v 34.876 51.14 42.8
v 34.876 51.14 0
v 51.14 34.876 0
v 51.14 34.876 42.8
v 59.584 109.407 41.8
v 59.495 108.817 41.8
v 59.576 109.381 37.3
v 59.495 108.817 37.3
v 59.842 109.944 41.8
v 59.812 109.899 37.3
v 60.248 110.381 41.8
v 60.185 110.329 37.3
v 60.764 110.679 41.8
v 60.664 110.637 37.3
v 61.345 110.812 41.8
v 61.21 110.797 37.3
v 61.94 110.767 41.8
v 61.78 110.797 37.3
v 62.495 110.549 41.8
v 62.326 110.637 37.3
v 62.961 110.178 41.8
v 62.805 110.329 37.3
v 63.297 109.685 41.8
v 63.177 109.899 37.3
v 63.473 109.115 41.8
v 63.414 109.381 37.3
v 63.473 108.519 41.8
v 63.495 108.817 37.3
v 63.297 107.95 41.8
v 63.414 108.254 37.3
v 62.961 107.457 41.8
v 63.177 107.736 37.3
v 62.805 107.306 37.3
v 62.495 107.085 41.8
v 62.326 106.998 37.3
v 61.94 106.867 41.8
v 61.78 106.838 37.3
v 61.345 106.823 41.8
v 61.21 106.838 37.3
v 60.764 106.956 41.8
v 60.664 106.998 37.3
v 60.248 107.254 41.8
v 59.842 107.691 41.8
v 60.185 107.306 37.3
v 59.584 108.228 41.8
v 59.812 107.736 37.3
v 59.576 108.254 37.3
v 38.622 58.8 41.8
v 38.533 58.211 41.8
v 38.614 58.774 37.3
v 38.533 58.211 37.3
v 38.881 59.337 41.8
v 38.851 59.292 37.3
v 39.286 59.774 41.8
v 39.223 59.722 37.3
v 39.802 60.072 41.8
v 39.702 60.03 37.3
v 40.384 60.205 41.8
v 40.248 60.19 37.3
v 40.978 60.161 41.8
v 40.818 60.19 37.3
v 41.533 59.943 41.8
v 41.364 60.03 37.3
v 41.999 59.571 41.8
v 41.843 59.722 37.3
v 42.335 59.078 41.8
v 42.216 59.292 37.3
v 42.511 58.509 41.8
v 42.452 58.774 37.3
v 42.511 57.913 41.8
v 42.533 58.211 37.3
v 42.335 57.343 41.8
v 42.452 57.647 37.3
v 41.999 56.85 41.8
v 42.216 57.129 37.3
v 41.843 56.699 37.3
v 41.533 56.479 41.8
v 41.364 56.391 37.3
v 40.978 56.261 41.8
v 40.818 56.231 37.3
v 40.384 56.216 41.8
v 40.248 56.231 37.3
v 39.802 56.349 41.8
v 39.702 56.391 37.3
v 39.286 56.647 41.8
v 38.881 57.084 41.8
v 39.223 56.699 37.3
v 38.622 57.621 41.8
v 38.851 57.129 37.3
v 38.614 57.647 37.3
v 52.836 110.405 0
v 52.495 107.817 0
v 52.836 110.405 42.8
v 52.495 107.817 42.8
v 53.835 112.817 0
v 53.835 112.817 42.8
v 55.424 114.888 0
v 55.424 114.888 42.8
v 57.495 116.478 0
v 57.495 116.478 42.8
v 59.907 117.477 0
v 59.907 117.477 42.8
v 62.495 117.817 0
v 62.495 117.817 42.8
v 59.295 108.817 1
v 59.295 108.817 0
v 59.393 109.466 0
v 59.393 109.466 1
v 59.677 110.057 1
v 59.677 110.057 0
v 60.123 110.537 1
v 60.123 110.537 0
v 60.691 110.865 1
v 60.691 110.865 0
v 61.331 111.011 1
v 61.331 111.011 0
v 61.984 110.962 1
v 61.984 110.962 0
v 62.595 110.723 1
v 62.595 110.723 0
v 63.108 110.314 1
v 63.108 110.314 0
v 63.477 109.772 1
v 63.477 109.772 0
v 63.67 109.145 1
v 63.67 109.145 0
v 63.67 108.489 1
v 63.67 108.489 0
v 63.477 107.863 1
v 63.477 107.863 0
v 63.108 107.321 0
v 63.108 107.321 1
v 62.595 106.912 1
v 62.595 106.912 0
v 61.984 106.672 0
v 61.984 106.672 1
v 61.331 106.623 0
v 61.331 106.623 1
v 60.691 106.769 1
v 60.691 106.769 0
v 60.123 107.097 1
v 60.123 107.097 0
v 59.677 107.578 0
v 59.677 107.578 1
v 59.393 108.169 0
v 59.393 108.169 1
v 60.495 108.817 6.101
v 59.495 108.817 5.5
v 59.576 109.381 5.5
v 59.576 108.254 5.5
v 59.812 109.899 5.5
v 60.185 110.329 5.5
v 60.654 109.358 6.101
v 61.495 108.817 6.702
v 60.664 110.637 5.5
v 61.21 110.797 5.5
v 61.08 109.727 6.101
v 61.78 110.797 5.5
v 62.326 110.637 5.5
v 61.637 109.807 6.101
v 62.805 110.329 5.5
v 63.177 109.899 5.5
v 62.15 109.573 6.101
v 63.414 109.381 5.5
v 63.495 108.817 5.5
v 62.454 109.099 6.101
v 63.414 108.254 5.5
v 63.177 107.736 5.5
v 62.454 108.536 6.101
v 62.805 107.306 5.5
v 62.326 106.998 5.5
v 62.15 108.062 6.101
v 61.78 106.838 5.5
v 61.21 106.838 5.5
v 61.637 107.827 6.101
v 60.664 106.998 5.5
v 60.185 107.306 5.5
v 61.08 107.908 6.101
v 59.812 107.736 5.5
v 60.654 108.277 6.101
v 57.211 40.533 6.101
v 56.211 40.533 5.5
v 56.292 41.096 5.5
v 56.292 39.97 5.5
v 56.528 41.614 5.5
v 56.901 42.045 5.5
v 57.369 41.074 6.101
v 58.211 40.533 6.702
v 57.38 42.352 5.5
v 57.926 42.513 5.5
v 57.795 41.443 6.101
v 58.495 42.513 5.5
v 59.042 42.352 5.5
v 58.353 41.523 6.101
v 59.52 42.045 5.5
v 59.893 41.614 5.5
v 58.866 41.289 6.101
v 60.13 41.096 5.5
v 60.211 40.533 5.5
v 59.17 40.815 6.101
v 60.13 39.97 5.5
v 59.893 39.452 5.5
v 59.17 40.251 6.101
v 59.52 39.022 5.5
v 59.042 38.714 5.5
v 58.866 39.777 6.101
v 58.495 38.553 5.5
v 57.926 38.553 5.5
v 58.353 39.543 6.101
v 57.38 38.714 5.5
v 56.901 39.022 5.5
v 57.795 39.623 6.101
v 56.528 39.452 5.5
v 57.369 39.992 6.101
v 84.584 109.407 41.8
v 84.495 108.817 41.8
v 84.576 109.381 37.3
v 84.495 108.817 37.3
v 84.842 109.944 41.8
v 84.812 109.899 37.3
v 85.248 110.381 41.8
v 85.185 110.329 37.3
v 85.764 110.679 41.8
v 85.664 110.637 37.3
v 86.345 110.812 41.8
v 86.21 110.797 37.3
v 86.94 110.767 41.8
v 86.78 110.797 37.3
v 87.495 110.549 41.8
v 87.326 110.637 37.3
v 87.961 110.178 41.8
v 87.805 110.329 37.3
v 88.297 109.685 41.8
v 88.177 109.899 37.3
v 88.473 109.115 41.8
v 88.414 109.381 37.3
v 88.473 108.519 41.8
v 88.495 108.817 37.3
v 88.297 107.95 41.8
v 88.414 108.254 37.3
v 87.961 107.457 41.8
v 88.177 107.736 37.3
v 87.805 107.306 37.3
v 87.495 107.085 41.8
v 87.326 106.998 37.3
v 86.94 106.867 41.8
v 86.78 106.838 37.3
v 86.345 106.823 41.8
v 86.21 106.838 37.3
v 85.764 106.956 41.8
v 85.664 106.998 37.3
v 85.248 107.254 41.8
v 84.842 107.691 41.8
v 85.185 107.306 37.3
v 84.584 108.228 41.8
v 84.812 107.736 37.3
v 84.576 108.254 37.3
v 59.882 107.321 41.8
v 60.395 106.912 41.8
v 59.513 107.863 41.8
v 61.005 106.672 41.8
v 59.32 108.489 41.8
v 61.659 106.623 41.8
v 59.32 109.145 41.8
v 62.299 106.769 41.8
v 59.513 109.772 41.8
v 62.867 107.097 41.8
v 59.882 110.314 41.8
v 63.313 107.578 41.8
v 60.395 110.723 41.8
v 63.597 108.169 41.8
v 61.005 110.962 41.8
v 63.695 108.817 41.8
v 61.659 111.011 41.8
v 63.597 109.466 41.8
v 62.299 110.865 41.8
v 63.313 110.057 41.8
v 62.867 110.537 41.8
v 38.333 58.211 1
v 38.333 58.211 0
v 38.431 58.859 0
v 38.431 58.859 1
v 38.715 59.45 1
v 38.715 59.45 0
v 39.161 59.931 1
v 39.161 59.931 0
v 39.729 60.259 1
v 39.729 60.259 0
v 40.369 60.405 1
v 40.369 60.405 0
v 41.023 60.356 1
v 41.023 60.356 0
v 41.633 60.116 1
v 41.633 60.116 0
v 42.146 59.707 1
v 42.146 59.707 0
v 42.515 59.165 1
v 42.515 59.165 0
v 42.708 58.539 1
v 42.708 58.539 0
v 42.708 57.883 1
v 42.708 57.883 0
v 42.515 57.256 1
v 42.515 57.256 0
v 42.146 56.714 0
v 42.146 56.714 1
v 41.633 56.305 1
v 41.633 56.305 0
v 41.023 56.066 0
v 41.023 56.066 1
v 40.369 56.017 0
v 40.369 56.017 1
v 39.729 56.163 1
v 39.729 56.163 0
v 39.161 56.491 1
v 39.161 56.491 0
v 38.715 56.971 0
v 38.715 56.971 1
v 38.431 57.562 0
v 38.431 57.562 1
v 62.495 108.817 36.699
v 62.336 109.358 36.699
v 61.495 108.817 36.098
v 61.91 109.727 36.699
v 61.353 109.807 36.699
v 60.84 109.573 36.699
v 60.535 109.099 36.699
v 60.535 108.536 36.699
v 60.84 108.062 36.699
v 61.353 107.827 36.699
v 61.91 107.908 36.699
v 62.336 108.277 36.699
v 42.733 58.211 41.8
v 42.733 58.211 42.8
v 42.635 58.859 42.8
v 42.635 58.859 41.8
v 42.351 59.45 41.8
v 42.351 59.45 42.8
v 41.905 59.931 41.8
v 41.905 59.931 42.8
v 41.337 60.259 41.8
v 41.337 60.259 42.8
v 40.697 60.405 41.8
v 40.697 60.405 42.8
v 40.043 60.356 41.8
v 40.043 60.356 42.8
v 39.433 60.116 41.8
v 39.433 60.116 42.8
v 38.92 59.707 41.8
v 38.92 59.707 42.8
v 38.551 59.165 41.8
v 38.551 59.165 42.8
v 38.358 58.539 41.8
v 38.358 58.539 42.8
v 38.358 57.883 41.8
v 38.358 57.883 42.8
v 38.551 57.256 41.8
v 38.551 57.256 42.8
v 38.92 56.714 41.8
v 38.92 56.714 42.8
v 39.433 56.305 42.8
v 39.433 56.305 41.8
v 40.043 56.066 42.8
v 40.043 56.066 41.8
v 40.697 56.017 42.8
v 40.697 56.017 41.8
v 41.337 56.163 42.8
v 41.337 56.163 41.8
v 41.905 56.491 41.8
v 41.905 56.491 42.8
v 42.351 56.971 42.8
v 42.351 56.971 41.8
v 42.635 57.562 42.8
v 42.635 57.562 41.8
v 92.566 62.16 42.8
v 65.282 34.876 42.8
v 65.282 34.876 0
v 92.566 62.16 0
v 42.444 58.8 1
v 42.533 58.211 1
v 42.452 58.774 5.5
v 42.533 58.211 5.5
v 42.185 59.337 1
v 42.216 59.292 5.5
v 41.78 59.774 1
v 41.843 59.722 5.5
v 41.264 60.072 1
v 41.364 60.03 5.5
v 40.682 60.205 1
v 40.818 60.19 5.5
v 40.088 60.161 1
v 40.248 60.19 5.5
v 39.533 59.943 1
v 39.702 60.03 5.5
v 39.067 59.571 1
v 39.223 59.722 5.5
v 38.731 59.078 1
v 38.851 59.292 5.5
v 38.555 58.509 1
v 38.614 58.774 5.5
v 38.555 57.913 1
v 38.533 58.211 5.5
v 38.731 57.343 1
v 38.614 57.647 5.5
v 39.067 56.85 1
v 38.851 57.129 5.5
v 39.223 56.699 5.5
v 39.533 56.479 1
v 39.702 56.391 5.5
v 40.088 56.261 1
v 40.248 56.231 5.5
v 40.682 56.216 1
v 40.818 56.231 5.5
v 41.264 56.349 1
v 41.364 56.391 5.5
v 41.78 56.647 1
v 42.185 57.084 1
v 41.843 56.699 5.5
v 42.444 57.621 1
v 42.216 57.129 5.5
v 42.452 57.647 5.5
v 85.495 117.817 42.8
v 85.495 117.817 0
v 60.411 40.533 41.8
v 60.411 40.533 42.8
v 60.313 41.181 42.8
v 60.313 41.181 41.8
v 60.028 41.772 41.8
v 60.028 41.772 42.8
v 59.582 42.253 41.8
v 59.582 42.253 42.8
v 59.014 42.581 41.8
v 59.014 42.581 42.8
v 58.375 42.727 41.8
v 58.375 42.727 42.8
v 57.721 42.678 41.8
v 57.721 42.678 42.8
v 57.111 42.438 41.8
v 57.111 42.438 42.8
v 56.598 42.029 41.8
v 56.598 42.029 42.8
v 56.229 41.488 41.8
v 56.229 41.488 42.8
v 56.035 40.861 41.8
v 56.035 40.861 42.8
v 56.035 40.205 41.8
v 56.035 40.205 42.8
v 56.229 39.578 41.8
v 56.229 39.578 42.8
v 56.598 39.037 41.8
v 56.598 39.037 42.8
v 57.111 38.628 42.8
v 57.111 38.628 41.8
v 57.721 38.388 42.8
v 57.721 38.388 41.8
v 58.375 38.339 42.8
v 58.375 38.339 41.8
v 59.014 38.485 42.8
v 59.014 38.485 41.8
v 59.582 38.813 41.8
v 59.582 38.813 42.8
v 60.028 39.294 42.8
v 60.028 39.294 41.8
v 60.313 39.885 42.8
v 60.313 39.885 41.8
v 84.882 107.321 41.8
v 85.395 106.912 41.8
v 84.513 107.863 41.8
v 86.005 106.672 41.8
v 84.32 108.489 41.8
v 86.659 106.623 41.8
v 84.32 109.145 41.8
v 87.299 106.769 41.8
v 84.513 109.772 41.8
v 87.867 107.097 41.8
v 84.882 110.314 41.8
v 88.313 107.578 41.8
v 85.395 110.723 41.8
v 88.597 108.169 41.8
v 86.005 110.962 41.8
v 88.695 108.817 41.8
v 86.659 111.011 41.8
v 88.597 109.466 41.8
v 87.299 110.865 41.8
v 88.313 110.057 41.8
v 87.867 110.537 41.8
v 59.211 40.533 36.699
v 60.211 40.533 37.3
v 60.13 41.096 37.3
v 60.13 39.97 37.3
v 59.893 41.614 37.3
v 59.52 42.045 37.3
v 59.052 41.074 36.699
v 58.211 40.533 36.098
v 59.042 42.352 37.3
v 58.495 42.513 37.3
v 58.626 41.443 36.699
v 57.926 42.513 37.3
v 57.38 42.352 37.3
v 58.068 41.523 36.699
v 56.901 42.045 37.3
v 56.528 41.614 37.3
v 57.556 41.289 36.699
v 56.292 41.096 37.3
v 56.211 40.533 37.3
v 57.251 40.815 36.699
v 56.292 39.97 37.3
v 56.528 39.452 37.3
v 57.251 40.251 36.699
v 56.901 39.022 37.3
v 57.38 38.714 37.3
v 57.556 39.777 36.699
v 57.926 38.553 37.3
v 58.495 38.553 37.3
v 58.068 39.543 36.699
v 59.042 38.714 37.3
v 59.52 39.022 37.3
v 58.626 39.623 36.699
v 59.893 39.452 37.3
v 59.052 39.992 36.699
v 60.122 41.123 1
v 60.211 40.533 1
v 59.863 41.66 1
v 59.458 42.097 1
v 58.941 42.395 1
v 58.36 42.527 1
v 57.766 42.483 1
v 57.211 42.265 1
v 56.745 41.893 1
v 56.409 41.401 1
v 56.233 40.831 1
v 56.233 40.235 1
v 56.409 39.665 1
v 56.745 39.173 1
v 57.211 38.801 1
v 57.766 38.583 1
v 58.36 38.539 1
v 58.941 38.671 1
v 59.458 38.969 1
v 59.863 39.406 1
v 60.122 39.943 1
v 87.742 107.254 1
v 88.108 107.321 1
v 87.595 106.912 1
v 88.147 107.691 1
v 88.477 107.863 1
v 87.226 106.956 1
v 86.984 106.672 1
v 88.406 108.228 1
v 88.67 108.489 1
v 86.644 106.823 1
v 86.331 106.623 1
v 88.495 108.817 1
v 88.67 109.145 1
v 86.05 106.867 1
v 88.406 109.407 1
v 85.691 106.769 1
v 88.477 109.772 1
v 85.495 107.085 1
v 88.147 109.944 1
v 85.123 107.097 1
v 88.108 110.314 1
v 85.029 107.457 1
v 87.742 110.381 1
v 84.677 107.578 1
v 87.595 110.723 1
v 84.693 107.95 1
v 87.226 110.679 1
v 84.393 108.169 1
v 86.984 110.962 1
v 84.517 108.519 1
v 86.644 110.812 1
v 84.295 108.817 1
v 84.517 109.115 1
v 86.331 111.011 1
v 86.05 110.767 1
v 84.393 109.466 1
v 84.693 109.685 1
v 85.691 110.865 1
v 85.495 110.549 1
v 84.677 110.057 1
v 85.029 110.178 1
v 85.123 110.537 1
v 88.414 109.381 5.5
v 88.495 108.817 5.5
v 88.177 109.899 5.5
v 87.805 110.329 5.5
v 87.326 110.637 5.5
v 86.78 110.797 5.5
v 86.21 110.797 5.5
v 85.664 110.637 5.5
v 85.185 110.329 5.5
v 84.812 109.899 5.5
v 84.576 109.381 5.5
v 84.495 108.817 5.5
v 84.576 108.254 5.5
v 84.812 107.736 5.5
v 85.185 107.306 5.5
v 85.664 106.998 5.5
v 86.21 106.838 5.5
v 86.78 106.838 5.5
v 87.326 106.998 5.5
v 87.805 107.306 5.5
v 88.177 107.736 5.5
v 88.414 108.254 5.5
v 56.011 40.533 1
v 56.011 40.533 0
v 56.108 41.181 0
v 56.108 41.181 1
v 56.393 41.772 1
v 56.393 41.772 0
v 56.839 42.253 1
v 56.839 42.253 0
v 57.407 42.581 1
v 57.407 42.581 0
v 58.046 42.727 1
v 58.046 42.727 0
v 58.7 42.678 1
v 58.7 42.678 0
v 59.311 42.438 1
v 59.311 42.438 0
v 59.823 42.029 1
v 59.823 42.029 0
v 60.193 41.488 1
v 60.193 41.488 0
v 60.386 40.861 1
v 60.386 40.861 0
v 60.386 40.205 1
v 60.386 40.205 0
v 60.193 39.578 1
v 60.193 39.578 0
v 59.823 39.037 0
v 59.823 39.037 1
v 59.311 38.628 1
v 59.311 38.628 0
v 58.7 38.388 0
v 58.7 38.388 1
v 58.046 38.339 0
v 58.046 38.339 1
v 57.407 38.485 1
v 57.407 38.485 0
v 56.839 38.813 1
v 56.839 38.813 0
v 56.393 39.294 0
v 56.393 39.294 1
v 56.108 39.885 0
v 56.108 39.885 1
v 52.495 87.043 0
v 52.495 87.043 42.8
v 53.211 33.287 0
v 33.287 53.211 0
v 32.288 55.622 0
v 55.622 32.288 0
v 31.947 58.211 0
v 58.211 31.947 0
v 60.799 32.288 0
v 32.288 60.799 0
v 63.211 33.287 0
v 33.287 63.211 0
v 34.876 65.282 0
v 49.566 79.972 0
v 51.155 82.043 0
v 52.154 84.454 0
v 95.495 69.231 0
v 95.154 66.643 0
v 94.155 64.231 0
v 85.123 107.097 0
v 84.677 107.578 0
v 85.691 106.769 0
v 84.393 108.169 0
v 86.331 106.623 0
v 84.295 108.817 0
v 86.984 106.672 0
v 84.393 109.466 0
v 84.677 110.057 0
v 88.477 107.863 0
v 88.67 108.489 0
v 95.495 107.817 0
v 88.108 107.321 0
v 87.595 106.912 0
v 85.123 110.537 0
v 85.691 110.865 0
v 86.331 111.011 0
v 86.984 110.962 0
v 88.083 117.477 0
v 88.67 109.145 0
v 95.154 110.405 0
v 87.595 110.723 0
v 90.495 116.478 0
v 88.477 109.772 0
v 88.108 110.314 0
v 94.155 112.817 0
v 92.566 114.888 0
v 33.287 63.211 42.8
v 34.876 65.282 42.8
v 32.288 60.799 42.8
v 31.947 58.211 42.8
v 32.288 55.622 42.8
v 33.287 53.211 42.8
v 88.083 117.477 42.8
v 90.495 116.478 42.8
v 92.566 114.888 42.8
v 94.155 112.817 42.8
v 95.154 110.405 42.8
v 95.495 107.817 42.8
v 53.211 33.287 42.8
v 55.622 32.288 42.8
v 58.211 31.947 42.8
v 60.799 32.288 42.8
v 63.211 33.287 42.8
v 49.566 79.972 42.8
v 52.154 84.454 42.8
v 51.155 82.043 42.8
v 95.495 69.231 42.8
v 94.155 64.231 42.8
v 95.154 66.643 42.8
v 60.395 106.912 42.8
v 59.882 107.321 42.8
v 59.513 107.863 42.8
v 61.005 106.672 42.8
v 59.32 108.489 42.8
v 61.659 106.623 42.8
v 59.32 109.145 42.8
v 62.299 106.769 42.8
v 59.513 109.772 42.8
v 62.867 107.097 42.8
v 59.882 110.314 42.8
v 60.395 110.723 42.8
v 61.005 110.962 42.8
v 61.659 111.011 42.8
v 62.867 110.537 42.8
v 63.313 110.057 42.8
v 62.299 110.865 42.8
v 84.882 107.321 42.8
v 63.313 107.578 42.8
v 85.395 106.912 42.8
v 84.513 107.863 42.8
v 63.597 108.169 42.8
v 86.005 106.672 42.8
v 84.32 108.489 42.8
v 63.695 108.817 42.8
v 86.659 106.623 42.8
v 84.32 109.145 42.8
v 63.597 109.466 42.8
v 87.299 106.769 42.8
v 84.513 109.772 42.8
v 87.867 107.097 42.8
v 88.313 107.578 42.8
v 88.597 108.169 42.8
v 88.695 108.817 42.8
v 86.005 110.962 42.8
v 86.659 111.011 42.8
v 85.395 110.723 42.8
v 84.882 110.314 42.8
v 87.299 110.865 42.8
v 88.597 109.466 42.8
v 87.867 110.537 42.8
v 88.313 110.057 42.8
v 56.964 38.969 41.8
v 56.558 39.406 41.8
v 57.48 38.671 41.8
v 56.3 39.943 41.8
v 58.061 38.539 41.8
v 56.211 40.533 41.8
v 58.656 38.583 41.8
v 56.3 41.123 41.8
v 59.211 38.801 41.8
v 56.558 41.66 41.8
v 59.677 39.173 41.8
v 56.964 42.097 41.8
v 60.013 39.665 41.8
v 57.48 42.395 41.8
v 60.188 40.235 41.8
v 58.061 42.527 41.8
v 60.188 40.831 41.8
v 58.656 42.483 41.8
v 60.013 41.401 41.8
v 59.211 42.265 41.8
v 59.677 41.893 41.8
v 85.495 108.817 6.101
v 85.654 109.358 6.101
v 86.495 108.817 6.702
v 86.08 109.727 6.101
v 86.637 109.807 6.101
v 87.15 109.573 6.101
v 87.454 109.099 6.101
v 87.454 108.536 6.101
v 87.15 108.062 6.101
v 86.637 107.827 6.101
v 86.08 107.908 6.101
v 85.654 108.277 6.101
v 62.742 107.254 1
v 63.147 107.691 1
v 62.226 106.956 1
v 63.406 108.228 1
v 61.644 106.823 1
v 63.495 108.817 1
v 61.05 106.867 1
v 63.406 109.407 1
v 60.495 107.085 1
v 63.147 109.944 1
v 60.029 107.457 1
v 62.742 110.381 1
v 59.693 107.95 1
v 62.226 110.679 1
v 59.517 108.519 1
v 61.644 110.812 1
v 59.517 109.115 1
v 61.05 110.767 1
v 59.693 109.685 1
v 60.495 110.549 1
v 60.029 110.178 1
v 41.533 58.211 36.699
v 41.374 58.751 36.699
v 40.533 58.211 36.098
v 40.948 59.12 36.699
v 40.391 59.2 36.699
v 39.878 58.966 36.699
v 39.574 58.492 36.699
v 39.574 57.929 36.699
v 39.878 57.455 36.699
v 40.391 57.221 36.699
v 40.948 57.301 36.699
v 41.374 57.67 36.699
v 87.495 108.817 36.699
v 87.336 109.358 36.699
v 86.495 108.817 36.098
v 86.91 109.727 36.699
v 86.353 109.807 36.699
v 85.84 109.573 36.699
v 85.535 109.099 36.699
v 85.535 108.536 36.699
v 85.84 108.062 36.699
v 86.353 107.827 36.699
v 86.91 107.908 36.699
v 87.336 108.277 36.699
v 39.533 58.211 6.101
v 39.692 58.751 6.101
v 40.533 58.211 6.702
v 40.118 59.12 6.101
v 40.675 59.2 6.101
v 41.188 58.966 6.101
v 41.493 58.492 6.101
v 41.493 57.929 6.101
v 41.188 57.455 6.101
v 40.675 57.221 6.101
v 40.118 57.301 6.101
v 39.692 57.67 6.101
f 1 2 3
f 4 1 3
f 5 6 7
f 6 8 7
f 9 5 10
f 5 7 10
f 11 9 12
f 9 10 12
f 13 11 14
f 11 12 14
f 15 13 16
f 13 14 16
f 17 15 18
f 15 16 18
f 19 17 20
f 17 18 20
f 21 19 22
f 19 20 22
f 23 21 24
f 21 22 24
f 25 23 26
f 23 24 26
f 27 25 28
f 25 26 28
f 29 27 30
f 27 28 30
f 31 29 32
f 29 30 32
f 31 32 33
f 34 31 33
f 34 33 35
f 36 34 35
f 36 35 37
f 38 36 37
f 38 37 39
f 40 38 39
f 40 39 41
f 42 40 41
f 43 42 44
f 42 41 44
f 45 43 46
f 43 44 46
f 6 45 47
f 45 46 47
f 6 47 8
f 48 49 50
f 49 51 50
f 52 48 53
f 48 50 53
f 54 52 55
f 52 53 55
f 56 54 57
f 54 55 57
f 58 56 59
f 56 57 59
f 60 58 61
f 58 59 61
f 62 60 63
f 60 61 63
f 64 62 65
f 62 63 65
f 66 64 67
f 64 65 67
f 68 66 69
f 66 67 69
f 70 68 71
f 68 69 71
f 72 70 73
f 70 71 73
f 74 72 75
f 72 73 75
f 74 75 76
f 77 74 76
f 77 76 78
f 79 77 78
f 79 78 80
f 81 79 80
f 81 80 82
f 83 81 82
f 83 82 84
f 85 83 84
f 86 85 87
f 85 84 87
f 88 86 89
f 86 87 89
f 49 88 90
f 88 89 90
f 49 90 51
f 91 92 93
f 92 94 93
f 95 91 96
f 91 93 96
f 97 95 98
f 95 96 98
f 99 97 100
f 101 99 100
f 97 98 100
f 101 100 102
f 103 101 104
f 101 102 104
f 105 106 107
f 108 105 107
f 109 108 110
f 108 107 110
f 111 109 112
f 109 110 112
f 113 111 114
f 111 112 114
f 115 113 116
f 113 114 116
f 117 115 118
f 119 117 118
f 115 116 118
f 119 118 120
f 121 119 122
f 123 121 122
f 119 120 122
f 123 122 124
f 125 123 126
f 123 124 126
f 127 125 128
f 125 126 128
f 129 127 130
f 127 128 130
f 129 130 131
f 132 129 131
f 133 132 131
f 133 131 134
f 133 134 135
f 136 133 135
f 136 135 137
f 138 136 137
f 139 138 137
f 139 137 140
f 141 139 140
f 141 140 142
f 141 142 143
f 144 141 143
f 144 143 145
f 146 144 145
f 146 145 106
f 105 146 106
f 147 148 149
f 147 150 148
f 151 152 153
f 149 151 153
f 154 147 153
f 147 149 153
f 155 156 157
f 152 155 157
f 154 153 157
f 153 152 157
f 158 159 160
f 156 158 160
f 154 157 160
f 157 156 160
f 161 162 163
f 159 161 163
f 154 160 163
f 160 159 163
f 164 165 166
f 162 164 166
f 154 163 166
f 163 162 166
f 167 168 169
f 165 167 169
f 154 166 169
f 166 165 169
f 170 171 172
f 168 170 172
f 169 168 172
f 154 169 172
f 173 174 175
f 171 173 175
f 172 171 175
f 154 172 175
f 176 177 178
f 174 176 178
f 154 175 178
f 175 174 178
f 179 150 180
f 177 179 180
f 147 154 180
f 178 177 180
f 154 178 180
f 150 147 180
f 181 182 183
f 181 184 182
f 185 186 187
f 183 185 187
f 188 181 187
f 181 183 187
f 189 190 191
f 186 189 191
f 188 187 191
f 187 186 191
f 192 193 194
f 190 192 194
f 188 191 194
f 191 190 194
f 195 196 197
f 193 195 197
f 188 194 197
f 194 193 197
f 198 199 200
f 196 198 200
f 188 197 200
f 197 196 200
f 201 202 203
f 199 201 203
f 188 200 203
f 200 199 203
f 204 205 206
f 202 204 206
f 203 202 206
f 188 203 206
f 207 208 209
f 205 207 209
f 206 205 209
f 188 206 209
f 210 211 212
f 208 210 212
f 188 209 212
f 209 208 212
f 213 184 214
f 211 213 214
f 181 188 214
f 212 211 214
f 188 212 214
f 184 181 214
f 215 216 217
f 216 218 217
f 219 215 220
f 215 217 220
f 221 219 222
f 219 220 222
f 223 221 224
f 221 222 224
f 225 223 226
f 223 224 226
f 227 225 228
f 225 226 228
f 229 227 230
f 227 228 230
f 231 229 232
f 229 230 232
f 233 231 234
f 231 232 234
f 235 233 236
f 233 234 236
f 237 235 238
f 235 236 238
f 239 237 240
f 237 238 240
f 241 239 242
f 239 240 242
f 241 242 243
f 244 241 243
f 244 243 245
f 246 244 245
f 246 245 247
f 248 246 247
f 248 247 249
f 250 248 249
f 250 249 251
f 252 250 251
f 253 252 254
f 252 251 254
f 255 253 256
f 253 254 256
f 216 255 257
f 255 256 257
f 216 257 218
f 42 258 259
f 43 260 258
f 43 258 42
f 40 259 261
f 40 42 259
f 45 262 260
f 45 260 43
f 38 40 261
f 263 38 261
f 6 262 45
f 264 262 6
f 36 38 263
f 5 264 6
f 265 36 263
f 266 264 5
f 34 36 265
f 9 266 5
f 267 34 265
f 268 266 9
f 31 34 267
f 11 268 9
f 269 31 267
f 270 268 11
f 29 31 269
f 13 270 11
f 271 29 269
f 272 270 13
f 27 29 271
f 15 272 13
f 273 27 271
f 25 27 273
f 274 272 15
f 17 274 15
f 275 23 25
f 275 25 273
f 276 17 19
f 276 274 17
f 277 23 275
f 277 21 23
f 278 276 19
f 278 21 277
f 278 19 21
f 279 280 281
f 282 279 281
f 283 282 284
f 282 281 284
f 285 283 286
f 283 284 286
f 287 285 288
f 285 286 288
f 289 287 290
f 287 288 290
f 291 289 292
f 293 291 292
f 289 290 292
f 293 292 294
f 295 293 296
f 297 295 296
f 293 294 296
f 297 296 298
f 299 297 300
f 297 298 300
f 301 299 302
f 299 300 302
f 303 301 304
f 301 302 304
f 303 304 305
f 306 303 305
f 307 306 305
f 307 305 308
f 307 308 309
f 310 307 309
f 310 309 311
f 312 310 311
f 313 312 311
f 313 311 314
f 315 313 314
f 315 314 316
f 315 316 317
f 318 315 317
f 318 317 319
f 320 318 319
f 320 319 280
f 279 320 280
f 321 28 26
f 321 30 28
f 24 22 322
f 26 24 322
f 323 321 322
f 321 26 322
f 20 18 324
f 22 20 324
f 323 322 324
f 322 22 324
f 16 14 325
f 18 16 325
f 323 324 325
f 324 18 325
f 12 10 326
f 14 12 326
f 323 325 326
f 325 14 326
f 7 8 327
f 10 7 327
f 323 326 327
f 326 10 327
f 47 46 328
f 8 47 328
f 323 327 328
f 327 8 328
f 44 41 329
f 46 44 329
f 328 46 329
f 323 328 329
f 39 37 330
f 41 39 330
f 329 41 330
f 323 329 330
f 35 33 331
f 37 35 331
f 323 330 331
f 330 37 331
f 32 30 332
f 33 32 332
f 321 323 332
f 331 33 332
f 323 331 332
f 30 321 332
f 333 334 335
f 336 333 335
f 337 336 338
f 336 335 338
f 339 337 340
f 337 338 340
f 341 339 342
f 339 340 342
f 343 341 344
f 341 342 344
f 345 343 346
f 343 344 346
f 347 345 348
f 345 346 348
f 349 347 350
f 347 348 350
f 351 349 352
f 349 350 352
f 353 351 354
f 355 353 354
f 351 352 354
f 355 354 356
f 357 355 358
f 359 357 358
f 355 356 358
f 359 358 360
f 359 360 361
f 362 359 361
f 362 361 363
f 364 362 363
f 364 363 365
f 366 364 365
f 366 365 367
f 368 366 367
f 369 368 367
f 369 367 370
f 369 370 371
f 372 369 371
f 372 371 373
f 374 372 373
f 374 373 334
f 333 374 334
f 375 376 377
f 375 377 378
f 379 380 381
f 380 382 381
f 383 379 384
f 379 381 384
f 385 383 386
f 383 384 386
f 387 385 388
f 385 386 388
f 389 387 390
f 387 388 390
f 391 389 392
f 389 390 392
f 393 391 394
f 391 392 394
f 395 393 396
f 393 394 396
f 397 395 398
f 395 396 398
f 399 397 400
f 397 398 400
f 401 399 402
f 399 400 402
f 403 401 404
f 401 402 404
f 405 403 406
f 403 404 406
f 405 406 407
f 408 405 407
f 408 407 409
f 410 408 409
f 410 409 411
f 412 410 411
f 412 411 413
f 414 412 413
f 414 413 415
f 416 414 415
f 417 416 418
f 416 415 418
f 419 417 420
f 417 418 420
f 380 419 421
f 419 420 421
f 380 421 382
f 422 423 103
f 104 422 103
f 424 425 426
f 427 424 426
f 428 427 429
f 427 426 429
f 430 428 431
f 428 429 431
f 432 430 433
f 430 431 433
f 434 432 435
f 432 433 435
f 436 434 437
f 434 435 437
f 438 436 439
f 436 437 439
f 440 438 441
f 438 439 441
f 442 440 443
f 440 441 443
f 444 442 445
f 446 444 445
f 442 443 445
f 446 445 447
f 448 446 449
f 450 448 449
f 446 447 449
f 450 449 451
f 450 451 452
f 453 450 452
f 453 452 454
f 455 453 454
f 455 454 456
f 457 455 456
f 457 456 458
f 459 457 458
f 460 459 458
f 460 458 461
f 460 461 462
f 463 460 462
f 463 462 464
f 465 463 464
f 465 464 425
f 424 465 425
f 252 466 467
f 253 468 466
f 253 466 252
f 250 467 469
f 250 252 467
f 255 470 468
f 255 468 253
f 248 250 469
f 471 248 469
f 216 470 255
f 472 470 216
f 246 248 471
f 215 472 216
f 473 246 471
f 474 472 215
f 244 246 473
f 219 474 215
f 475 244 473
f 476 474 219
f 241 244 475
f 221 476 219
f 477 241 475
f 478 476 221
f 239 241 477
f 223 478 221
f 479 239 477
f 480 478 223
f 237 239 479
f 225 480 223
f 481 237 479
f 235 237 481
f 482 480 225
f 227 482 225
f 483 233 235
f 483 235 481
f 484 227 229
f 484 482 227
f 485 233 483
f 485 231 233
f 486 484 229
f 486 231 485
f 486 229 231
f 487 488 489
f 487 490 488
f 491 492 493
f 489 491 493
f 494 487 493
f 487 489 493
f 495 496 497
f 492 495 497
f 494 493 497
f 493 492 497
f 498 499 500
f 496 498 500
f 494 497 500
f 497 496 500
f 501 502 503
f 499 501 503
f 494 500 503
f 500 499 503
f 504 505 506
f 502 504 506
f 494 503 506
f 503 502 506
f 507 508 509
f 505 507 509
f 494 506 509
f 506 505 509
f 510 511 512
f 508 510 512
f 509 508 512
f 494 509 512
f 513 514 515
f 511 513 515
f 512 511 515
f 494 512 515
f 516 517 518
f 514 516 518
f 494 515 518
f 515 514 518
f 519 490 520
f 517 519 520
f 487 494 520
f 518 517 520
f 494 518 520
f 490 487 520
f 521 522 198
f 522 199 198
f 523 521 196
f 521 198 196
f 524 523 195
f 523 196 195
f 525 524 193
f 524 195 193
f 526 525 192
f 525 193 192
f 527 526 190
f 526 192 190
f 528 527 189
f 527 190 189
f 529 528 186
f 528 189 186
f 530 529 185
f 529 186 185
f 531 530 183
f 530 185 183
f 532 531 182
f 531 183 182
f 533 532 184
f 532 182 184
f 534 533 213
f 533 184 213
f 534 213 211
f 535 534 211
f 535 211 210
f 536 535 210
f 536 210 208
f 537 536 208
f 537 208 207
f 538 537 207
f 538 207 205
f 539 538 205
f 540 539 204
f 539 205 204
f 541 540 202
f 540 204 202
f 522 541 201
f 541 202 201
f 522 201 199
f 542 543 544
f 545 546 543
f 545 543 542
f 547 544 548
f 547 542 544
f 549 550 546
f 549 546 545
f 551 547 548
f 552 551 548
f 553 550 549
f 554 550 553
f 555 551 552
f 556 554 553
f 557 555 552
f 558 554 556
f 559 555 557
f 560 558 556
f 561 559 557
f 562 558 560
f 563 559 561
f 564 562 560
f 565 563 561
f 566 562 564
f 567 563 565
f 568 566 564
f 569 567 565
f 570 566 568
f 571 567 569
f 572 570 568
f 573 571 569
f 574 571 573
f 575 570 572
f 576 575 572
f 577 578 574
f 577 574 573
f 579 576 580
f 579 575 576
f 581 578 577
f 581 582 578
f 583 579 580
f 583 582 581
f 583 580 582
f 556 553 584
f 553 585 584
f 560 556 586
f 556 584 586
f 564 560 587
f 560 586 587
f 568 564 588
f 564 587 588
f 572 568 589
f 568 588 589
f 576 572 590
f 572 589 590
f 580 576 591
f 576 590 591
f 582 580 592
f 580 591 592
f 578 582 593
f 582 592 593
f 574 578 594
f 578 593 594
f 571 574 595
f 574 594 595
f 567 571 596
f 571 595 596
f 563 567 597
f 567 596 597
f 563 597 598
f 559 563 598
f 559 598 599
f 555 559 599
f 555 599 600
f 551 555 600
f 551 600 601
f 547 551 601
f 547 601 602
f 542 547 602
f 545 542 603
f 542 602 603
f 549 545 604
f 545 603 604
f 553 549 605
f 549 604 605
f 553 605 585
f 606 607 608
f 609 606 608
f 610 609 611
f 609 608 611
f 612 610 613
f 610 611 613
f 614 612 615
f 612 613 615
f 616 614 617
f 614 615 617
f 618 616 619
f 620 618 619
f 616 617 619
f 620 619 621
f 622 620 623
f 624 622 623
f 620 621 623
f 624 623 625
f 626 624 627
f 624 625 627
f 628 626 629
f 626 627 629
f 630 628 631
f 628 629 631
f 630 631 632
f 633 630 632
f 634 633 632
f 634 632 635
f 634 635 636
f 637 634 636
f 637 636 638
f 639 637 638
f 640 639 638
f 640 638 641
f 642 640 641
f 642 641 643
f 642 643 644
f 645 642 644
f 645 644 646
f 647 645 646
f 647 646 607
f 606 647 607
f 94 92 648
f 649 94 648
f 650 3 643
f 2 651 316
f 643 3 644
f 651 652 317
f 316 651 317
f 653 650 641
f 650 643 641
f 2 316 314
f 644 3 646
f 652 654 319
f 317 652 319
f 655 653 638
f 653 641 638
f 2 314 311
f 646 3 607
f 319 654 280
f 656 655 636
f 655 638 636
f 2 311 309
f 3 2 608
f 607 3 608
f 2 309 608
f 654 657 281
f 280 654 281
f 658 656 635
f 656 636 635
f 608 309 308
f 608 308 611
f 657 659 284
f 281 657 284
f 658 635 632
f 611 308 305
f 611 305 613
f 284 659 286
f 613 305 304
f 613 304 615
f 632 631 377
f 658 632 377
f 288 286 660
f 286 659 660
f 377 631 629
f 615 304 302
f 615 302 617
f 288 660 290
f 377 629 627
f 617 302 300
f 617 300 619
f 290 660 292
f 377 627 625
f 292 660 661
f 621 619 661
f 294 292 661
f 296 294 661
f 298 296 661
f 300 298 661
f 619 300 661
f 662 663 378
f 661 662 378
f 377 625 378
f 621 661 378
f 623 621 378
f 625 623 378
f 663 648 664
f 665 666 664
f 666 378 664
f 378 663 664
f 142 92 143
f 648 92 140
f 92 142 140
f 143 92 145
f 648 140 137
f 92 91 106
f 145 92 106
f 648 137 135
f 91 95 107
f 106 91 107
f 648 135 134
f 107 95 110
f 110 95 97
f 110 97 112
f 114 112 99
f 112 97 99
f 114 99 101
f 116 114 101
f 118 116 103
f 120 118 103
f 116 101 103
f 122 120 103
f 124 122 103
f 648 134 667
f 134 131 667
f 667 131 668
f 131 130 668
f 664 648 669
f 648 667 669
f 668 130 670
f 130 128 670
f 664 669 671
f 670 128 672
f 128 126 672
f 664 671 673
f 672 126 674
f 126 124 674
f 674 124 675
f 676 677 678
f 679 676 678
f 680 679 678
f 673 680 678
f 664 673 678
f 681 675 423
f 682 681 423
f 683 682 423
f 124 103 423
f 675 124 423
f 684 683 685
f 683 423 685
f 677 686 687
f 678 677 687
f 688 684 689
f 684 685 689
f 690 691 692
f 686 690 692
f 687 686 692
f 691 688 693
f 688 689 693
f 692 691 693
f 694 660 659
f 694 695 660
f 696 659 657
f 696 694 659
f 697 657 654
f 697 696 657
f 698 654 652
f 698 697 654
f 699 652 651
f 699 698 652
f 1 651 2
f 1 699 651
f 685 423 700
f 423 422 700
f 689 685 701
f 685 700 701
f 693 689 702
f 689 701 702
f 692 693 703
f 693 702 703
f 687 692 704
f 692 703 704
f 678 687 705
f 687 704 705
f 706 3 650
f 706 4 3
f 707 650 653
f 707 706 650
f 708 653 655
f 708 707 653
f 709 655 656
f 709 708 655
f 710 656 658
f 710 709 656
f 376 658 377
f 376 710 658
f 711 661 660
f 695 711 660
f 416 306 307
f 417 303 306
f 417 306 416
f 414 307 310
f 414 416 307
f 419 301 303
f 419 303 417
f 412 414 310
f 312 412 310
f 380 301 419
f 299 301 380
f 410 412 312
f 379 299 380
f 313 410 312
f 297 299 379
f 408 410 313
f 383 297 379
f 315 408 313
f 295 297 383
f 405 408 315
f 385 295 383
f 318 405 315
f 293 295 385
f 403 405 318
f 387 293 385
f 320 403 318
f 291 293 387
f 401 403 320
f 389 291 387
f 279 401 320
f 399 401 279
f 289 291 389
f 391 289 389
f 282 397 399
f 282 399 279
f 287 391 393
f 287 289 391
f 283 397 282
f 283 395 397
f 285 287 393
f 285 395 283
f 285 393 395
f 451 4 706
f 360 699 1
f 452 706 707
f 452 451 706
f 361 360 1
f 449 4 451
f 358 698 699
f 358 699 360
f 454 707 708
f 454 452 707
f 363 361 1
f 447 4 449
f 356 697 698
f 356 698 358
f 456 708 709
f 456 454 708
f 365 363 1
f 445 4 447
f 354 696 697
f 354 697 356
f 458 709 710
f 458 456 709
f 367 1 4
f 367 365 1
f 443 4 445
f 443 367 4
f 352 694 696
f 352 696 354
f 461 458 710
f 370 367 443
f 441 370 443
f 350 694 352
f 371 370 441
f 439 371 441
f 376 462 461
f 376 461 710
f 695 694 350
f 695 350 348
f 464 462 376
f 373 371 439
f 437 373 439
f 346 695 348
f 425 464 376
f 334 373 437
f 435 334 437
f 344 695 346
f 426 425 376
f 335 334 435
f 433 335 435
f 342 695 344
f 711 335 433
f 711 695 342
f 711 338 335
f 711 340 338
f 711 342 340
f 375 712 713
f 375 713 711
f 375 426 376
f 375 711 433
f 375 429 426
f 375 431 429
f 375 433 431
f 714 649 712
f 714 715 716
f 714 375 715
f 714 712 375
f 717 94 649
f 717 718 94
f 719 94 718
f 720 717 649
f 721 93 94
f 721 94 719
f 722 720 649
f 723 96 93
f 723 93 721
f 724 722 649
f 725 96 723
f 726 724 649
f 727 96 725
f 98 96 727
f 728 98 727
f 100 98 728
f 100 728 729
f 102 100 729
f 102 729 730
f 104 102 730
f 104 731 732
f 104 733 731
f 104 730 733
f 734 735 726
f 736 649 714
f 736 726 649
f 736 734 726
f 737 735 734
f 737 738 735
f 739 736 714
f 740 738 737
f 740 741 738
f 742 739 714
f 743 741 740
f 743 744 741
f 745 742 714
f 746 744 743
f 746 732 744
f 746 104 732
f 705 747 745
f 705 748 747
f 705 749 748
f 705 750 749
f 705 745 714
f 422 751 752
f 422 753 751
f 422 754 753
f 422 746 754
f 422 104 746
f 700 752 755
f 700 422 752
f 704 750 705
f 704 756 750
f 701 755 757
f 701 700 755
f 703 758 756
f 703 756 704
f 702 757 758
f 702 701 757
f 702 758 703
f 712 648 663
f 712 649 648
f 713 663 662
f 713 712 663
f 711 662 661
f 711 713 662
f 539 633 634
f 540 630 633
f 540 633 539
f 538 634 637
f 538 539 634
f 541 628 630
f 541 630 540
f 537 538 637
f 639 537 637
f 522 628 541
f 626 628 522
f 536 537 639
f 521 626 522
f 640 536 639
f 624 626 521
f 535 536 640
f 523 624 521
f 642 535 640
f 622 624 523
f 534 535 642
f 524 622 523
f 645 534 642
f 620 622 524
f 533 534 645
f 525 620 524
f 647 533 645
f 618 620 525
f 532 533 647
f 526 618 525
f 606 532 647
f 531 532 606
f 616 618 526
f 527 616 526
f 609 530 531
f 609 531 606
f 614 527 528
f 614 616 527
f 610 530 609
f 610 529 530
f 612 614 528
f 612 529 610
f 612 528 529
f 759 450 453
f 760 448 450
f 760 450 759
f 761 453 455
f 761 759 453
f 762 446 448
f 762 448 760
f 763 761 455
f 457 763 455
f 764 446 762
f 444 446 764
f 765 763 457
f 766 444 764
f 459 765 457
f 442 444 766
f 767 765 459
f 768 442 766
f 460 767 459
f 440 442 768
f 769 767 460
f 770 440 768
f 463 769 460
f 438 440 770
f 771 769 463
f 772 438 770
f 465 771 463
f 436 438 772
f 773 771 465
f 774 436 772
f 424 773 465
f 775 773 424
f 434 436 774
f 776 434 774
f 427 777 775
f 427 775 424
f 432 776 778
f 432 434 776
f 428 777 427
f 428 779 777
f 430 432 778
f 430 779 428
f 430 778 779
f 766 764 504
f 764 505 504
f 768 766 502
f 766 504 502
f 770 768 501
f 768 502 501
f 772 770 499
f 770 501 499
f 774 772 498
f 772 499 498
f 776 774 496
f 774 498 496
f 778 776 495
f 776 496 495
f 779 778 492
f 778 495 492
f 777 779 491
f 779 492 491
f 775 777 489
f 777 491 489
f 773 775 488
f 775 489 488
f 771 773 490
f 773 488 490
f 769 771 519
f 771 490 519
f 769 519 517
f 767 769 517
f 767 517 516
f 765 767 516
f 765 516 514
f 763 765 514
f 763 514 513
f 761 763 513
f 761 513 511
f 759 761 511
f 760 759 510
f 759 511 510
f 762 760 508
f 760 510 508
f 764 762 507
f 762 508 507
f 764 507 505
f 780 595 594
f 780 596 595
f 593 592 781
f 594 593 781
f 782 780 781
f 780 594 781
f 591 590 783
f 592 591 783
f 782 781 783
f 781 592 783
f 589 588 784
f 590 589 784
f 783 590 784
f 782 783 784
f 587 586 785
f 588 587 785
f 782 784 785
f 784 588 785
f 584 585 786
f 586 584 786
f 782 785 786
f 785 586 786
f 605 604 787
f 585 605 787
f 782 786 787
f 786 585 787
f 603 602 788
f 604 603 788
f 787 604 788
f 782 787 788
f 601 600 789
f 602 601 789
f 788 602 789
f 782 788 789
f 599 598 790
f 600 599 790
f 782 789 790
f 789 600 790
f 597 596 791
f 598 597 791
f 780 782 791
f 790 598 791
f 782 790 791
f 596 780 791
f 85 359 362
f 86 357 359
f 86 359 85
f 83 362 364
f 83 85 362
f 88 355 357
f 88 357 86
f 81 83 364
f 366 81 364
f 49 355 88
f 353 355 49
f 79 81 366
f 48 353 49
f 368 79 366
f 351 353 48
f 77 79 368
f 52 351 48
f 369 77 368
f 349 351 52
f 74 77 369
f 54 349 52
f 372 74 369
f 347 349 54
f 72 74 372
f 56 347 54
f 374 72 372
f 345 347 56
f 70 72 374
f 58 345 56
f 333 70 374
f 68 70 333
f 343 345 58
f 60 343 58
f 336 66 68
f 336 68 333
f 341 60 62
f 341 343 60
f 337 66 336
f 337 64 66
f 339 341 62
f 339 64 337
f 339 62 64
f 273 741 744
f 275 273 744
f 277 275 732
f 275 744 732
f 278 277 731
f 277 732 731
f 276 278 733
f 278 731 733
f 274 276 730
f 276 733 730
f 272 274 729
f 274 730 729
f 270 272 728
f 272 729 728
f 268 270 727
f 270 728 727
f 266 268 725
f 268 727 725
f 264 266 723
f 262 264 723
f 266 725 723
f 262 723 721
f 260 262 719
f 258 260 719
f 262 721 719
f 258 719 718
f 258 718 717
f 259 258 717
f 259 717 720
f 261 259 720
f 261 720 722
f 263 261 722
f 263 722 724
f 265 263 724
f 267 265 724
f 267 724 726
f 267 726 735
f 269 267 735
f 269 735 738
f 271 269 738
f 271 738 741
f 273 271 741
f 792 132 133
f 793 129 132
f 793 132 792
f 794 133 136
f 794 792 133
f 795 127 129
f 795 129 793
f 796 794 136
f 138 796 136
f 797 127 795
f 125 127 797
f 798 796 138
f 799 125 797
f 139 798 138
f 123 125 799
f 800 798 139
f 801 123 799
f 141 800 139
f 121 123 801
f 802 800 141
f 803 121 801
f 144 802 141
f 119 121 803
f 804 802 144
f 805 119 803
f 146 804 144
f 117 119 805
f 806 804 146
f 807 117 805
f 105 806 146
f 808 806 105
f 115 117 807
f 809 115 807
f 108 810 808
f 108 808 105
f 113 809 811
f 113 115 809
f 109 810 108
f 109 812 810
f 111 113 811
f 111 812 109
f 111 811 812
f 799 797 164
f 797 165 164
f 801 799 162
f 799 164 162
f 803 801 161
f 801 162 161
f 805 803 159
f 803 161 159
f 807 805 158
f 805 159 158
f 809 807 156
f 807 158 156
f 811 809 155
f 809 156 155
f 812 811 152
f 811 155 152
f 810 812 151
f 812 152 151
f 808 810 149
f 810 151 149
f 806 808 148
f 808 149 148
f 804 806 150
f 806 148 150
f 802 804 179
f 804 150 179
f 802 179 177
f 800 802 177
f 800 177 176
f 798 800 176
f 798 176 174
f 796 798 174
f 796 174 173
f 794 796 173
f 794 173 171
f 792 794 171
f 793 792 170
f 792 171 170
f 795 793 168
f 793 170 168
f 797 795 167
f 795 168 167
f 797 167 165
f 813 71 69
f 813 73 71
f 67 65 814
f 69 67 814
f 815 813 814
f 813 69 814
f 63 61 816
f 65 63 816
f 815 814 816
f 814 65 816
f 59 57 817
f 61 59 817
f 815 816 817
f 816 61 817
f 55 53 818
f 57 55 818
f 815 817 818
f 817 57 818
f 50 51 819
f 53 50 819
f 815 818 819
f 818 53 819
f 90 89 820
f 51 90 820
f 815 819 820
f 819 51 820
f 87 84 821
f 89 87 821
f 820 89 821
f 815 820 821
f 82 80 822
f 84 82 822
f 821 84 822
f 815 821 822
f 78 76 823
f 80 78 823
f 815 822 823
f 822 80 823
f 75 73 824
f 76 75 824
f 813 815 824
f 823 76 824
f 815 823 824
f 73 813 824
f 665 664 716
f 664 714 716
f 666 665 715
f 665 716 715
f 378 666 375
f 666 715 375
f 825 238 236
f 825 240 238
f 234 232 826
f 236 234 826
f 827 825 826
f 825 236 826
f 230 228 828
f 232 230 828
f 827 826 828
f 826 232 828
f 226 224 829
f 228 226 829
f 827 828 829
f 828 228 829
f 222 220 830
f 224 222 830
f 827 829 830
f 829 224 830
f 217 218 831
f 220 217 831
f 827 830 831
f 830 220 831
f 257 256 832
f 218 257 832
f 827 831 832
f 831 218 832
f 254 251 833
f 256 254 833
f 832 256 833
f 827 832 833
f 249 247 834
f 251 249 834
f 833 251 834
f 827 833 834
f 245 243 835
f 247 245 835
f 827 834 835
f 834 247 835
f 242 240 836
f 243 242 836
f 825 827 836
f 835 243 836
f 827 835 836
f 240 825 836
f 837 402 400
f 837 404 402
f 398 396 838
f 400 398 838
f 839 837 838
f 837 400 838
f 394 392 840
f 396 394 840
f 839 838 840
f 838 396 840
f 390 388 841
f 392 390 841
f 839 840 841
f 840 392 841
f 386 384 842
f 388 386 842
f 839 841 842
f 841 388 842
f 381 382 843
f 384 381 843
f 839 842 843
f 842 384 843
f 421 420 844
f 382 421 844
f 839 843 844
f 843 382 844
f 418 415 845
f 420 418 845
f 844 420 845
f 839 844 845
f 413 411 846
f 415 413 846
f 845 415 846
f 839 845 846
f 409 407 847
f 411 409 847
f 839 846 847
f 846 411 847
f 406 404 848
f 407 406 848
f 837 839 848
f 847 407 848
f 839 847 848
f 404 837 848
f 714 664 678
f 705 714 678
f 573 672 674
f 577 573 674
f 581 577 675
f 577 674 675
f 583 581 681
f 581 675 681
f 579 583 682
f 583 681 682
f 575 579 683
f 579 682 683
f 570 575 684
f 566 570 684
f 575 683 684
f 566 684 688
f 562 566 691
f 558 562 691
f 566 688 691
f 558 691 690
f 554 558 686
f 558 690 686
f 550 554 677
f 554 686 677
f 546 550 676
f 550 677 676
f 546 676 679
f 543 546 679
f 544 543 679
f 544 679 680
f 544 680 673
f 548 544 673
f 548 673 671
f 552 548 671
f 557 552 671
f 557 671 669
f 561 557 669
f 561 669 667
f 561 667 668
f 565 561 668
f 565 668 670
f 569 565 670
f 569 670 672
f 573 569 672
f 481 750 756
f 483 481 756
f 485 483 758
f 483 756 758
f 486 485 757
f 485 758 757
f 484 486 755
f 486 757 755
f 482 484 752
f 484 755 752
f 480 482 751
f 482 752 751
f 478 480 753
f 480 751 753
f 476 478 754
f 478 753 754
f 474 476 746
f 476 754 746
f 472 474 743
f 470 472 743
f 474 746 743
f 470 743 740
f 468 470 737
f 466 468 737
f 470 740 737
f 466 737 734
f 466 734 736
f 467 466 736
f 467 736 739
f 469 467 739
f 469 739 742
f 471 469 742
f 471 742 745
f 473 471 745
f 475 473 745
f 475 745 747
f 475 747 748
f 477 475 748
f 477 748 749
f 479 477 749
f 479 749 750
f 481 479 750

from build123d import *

# Parameters (mm, degrees)
BOSS_EXTRUDE1_DEPTH                          = 42.8
CBORE_FOR_M5_HEX_HEAD_CAP_SCREW1_D           = 4
CBORE_FOR_M5_HEX_HEAD_CAP_SCREW1_DEPTH       = 5.5
CBORE_FOR_M5_HEX_HEAD_CAP_SCREW1_CBORE_D     = 4.4
CBORE_FOR_M5_HEX_HEAD_CAP_SCREW1_CBORE_DEPTH = 1
CBORE_FOR_M5_HEX_HEAD_CAP_SCREW1_TIP         = 1.201721238
CBORE_FOR_M5_HEX_HEAD_CAP_SCREW2_D           = 4
CBORE_FOR_M5_HEX_HEAD_CAP_SCREW2_DEPTH       = 5.5
CBORE_FOR_M5_HEX_HEAD_CAP_SCREW2_CBORE_D     = 4.4
CBORE_FOR_M5_HEX_HEAD_CAP_SCREW2_CBORE_DEPTH = 1
CBORE_FOR_M5_HEX_HEAD_CAP_SCREW2_TIP         = 1.201721238
FILLET1_R                                    = 10


with BuildPart() as part:
    # Sketch3 → Boss-Extrude1 (new body)
    with BuildSketch(Plane.XY):
        Polygon((52.494949366, 117.817279836), (52.494949366, 82.900540957), (27.805086528, 58.210678119), (58.210678119, 27.805086528), (95.494949366, 65.089357775), (95.494949366, 117.817279836), align=None)
    extrude(amount=BOSS_EXTRUDE1_DEPTH)

    # CBORE for M5 Hex Head Cap Screw1
    with Locations(Plane(origin=(0, 0, 0), x_dir=(-1, 0, 0), z_dir=(0, 0, -1))):
        with Locations((-86.494949366, 108.817279836), (-61.494949366, 108.817279836), (-58.210678119, 40.533008589), (-40.533008589, 58.210678119)):
            CounterBoreHole(CBORE_FOR_M5_HEX_HEAD_CAP_SCREW1_D / 2, CBORE_FOR_M5_HEX_HEAD_CAP_SCREW1_CBORE_D / 2, CBORE_FOR_M5_HEX_HEAD_CAP_SCREW1_CBORE_DEPTH, depth=CBORE_FOR_M5_HEX_HEAD_CAP_SCREW1_DEPTH)
            with Locations((0, 0, -(CBORE_FOR_M5_HEX_HEAD_CAP_SCREW1_DEPTH + CBORE_FOR_M5_HEX_HEAD_CAP_SCREW1_TIP / 2))):  # 118° drill point
                Cone(0, CBORE_FOR_M5_HEX_HEAD_CAP_SCREW1_D / 2, CBORE_FOR_M5_HEX_HEAD_CAP_SCREW1_TIP, mode=Mode.SUBTRACT)

    # CBORE for M5 Hex Head Cap Screw2
    with Locations(Plane.XY.offset(42.8)):
        with Locations((61.494949366, 108.817279836), (86.494949366, 108.817279836), (58.210678119, 40.533008589), (40.533008589, 58.210678119)):
            CounterBoreHole(CBORE_FOR_M5_HEX_HEAD_CAP_SCREW2_D / 2, CBORE_FOR_M5_HEX_HEAD_CAP_SCREW2_CBORE_D / 2, CBORE_FOR_M5_HEX_HEAD_CAP_SCREW2_CBORE_DEPTH, depth=CBORE_FOR_M5_HEX_HEAD_CAP_SCREW2_DEPTH)
            with Locations((0, 0, -(CBORE_FOR_M5_HEX_HEAD_CAP_SCREW2_DEPTH + CBORE_FOR_M5_HEX_HEAD_CAP_SCREW2_TIP / 2))):  # 118° drill point
                Cone(0, CBORE_FOR_M5_HEX_HEAD_CAP_SCREW2_D / 2, CBORE_FOR_M5_HEX_HEAD_CAP_SCREW2_TIP, mode=Mode.SUBTRACT)

    # Fillet1
    fillet1_edges = [part.edges().sort_by_distance(p)[0] for p in [
        (95.494949366, 117.817279836, 21.4),
        (95.494949366, 65.089357775, 21.4),
        (58.210678119, 27.805086528, 21.4),
        (27.805086528, 58.210678119, 21.4),
        (52.494949366, 82.900540957, 21.4),
        (52.494949366, 117.817279836, 21.4),
    ]]
    fillet(fillet1_edges, radius=FILLET1_R)


solid = part.part
